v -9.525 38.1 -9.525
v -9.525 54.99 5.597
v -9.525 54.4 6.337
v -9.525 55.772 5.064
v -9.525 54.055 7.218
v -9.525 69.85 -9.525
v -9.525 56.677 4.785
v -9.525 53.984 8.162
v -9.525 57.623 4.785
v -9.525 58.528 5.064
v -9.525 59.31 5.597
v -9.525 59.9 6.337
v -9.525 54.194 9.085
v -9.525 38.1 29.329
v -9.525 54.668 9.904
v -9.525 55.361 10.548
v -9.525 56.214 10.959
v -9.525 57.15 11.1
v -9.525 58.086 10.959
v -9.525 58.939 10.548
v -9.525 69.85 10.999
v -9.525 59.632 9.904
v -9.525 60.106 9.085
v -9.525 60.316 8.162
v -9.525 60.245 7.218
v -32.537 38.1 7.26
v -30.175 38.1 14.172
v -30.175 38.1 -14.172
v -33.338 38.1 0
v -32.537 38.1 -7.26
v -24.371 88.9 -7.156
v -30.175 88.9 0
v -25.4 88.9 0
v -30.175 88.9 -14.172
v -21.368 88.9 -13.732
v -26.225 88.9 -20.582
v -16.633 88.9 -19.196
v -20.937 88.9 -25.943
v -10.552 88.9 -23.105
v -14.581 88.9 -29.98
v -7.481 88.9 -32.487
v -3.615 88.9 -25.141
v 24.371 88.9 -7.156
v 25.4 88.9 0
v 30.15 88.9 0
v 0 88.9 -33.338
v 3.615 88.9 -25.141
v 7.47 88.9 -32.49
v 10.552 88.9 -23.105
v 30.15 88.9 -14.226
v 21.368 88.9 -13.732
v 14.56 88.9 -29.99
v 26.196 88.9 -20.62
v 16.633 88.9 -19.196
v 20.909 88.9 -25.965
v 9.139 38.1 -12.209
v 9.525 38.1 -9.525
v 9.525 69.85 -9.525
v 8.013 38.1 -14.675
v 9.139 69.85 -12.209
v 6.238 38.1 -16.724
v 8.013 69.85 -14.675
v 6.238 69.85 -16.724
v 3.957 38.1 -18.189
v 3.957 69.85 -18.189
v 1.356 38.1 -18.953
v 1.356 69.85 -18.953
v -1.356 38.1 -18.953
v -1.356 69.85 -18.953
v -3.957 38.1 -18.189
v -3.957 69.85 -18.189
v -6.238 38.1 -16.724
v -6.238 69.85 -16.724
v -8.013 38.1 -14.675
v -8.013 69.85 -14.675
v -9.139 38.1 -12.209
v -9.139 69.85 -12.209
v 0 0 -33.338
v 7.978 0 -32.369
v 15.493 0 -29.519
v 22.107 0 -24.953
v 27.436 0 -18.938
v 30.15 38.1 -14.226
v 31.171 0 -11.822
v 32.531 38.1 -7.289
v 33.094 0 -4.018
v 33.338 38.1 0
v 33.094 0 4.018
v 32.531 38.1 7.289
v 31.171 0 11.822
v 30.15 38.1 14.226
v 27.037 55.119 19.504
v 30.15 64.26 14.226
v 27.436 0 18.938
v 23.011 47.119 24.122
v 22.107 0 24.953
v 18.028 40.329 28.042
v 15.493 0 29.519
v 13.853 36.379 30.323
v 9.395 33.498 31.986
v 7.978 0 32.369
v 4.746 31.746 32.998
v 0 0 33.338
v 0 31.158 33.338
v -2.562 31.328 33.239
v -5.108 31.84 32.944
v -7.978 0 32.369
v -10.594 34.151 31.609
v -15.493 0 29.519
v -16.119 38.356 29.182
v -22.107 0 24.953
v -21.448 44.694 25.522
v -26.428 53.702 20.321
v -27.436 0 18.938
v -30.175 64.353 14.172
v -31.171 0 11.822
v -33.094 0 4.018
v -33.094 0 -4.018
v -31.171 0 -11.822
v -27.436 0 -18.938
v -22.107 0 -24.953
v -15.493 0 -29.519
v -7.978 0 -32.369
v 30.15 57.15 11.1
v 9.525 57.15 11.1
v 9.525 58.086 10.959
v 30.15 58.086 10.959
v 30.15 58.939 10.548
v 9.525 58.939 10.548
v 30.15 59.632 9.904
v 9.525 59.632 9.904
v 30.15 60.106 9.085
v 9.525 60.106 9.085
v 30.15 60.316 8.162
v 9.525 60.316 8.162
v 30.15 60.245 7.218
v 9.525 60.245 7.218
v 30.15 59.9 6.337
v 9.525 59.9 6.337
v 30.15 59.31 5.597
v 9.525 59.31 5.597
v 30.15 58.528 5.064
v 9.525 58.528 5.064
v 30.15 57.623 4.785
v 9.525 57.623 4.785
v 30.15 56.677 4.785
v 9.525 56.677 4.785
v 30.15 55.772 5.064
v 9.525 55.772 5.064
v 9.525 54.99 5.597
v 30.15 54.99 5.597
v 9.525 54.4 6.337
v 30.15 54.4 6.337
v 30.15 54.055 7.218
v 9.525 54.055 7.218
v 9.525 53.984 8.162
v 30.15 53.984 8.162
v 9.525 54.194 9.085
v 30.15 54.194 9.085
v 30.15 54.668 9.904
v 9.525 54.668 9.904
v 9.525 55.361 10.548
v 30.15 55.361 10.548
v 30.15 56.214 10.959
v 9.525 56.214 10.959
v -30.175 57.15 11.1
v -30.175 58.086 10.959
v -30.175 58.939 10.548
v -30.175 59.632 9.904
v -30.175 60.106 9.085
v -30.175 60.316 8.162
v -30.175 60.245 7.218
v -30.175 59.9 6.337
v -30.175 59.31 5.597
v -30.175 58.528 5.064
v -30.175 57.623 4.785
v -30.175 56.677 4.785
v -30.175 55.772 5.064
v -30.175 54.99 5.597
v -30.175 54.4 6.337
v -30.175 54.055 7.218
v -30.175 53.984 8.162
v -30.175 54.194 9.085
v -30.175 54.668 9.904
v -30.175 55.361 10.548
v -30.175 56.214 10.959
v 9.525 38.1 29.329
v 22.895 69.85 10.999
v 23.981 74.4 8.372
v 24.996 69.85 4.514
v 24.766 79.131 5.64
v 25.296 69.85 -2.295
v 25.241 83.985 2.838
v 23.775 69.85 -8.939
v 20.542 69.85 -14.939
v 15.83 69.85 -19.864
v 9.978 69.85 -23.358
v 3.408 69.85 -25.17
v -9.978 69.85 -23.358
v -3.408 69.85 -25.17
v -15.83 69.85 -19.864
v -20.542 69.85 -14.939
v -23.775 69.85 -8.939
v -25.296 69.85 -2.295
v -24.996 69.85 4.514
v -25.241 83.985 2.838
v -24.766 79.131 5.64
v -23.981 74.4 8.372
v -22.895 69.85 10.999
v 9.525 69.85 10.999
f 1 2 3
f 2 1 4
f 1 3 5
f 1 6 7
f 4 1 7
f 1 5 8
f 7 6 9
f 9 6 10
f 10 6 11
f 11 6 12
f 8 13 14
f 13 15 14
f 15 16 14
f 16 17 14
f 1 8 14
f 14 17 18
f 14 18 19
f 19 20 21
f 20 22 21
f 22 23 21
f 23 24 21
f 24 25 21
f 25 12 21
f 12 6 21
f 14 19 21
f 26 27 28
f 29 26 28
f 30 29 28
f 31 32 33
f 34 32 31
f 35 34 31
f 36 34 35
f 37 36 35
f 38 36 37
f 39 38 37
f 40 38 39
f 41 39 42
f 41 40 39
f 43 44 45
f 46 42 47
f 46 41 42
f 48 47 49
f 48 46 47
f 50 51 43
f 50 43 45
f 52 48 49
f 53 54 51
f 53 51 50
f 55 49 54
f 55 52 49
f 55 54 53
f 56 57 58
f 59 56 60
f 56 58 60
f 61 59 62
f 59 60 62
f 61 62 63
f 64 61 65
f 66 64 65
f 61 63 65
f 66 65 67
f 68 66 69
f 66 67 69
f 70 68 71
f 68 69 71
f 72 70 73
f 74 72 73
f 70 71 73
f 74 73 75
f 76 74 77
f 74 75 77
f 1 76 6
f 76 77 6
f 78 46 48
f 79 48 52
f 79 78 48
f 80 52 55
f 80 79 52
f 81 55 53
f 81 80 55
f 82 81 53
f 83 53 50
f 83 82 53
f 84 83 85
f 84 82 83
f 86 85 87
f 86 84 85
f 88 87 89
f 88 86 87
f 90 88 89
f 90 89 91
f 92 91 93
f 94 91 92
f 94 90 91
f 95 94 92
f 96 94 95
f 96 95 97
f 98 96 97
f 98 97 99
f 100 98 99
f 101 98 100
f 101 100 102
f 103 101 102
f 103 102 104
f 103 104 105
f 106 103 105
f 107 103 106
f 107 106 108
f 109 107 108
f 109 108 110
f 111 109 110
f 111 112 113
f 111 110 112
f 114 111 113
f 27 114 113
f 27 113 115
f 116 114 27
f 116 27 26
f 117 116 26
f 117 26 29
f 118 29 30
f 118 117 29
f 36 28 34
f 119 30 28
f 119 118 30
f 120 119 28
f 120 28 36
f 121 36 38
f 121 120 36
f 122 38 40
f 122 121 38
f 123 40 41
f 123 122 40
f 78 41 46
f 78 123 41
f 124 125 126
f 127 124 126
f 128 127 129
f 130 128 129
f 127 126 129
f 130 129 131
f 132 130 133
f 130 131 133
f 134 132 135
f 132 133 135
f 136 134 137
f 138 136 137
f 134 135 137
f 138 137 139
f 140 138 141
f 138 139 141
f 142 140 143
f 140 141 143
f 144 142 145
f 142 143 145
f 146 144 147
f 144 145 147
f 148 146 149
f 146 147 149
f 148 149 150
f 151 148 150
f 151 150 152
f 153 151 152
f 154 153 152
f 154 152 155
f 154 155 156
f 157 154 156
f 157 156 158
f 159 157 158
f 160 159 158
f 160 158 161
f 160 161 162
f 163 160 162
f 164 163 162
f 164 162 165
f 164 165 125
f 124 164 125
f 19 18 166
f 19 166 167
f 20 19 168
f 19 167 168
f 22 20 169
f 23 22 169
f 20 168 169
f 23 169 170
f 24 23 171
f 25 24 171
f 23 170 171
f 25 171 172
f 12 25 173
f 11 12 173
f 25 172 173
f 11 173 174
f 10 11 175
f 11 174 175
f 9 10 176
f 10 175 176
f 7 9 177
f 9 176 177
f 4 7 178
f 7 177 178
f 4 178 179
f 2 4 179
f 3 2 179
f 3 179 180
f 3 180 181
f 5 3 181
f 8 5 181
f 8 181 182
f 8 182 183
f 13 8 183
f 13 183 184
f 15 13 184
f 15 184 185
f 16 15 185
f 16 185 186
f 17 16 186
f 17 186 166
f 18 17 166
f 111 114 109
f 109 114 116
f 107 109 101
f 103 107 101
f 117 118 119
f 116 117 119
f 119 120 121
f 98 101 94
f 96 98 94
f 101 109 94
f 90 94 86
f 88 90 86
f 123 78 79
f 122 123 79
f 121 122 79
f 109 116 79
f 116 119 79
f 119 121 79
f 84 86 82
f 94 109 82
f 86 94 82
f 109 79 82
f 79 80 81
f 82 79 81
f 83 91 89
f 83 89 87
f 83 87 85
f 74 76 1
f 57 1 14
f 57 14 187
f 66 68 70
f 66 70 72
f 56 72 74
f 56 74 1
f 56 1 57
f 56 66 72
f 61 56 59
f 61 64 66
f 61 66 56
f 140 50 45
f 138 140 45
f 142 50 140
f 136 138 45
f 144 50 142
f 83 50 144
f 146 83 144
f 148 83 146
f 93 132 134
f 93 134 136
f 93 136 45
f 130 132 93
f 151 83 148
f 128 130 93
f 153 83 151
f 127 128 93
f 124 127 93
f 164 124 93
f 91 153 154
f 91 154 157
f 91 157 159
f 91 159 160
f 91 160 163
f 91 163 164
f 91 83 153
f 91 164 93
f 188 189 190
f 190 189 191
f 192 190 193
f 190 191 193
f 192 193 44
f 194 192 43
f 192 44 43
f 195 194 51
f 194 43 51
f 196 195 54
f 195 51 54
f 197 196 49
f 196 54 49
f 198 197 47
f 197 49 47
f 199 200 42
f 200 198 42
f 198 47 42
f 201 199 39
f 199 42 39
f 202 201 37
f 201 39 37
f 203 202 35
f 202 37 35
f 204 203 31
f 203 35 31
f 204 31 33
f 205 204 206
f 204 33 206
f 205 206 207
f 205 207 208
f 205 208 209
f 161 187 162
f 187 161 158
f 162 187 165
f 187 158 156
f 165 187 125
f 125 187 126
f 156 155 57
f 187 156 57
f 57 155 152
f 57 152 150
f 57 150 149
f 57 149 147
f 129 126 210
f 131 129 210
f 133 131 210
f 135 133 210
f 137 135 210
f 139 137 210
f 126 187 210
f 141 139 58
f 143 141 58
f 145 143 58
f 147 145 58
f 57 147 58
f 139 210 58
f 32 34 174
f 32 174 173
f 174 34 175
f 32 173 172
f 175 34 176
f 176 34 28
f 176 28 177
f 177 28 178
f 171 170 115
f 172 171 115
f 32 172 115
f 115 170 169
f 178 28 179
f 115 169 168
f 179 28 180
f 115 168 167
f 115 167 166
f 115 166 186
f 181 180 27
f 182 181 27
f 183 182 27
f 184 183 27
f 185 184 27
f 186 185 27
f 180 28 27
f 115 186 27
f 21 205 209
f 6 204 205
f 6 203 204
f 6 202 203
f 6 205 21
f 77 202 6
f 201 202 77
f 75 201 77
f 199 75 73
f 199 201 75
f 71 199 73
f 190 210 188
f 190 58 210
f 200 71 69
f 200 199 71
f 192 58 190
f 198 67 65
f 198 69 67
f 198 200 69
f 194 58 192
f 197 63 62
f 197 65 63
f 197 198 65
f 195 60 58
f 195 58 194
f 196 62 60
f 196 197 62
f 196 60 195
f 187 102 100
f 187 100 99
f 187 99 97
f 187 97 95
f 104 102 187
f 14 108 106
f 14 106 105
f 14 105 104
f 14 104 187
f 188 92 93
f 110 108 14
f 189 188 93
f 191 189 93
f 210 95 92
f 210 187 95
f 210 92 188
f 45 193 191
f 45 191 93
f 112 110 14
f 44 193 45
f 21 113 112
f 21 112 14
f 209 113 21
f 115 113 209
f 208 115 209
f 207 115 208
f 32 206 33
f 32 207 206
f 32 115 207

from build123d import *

# Parameters (mm, degrees)
CROQUIS2_W              = 66.675
CROQUIS2_H              = 66.675
SALIENTE_EXTRUIR2_DEPTH = 88.9
CORTAR_EXTRUIR1_DEPTH   = 117.01790608
CROQUIS5_OUTSIDE_W      = 94.593
CROQUIS5_OUTSIDE_H      = 94.593
CROQUIS5_OUTSIDE_R      = 33.3375
CORTAR_EXTRUIR2_DEPTH   = 88.9
CROQUIS6_R              = 25.4
CORTAR_EXTRUIR4_DEPTH   = 19.05
CORTAR_EXTRUIR5_DEPTH   = 31.75
CORTAR_EXTRUIR6_START   = -50.8
CORTAR_EXTRUIR6_DEPTH   = 50.8
CROQUIS9_R              = 3.175
CORTAR_EXTRUIR7_DEPTH   = 60.325


with BuildPart() as part:
    # Croquis2 → Saliente-Extruir2 (new body)
    with BuildSketch(Plane(origin=(0, 0, 0), x_dir=(1, 0, 0), z_dir=(0, 1, 0))):
        Rectangle(CROQUIS2_W, CROQUIS2_H)
    extrude(amount=SALIENTE_EXTRUIR2_DEPTH)

    # Croquis4 → Cortar-Extruir1 (cut, through all)
    with BuildSketch(Plane.ZY.offset(33.3375)):
        Polygon((33.3375, 31.157756203), (0, 88.9), (33.3375, 88.9), align=None)
    extrude(amount=-CORTAR_EXTRUIR1_DEPTH, mode=Mode.SUBTRACT)

    # Croquis5 outside → Cortar-Extruir2 (cut)
    with BuildSketch(Plane.XZ):
        with Locations((-0.0005, 0.0005)):
            Rectangle(CROQUIS5_OUTSIDE_W, CROQUIS5_OUTSIDE_H)
        with Locations(Location((0, 0, 0), (0, 0, 270))):
            Circle(CROQUIS5_OUTSIDE_R, mode=Mode.SUBTRACT)
    extrude(amount=-CORTAR_EXTRUIR2_DEPTH, mode=Mode.SUBTRACT)

    # Croquis6 → Cortar-Extruir4 (cut)
    with BuildSketch(Plane(origin=(0, 88.9, 0), x_dir=(1, 0, 0), z_dir=(0, 1, 0))):
        Circle(CROQUIS6_R)
    extrude(amount=-CORTAR_EXTRUIR4_DEPTH, mode=Mode.SUBTRACT)

    # Croquis7 → Cortar-Extruir5 (cut)
    with BuildSketch(Plane(origin=(0, 69.85, 0), x_dir=(1, 0, 0), z_dir=(0, 1, 0))):
        with BuildLine():
            Line((-9.525, 9.525), (-9.525, -31.947821229))
            Line((-9.525, -31.947821229), (9.525, -31.947821229))
            Line((9.525, -31.947821229), (9.525, 9.525))
            ThreePointArc((9.525, 9.525), (0, 19.05), (-9.525, 9.525))
        make_face()
    extrude(amount=-CORTAR_EXTRUIR5_DEPTH, mode=Mode.SUBTRACT)

    # Croquis8 → Cortar-Extruir6 (cut)
    with BuildSketch(Plane(origin=(0, 88.9, 0), x_dir=(1, 0, 0), z_dir=(0, 1, 0)).offset(CORTAR_EXTRUIR6_START)):
        with BuildLine():
            Line((-30.1752, 14.172022128), (-30.1752, -14.172022128))
            ThreePointArc((-30.1752, -14.172022128), (-33.3375, 0), (-30.1752, 14.172022128))
        make_face()
        with BuildLine():
            Line((30.1498, 14.225978568), (30.1498, -14.225978568))
            ThreePointArc((30.1498, -14.225978568), (33.3375, 0), (30.1498, 14.225978568))
        make_face()
    extrude(amount=CORTAR_EXTRUIR6_DEPTH, mode=Mode.SUBTRACT)

    # Croquis9 → Cortar-Extruir7 (cut)
    with BuildSketch(Plane.ZY.offset(30.1752)):
        with Locations((7.9248, 57.15)):
            Circle(CROQUIS9_R)
    extrude(amount=-CORTAR_EXTRUIR7_DEPTH, mode=Mode.SUBTRACT)


solid = part.part
